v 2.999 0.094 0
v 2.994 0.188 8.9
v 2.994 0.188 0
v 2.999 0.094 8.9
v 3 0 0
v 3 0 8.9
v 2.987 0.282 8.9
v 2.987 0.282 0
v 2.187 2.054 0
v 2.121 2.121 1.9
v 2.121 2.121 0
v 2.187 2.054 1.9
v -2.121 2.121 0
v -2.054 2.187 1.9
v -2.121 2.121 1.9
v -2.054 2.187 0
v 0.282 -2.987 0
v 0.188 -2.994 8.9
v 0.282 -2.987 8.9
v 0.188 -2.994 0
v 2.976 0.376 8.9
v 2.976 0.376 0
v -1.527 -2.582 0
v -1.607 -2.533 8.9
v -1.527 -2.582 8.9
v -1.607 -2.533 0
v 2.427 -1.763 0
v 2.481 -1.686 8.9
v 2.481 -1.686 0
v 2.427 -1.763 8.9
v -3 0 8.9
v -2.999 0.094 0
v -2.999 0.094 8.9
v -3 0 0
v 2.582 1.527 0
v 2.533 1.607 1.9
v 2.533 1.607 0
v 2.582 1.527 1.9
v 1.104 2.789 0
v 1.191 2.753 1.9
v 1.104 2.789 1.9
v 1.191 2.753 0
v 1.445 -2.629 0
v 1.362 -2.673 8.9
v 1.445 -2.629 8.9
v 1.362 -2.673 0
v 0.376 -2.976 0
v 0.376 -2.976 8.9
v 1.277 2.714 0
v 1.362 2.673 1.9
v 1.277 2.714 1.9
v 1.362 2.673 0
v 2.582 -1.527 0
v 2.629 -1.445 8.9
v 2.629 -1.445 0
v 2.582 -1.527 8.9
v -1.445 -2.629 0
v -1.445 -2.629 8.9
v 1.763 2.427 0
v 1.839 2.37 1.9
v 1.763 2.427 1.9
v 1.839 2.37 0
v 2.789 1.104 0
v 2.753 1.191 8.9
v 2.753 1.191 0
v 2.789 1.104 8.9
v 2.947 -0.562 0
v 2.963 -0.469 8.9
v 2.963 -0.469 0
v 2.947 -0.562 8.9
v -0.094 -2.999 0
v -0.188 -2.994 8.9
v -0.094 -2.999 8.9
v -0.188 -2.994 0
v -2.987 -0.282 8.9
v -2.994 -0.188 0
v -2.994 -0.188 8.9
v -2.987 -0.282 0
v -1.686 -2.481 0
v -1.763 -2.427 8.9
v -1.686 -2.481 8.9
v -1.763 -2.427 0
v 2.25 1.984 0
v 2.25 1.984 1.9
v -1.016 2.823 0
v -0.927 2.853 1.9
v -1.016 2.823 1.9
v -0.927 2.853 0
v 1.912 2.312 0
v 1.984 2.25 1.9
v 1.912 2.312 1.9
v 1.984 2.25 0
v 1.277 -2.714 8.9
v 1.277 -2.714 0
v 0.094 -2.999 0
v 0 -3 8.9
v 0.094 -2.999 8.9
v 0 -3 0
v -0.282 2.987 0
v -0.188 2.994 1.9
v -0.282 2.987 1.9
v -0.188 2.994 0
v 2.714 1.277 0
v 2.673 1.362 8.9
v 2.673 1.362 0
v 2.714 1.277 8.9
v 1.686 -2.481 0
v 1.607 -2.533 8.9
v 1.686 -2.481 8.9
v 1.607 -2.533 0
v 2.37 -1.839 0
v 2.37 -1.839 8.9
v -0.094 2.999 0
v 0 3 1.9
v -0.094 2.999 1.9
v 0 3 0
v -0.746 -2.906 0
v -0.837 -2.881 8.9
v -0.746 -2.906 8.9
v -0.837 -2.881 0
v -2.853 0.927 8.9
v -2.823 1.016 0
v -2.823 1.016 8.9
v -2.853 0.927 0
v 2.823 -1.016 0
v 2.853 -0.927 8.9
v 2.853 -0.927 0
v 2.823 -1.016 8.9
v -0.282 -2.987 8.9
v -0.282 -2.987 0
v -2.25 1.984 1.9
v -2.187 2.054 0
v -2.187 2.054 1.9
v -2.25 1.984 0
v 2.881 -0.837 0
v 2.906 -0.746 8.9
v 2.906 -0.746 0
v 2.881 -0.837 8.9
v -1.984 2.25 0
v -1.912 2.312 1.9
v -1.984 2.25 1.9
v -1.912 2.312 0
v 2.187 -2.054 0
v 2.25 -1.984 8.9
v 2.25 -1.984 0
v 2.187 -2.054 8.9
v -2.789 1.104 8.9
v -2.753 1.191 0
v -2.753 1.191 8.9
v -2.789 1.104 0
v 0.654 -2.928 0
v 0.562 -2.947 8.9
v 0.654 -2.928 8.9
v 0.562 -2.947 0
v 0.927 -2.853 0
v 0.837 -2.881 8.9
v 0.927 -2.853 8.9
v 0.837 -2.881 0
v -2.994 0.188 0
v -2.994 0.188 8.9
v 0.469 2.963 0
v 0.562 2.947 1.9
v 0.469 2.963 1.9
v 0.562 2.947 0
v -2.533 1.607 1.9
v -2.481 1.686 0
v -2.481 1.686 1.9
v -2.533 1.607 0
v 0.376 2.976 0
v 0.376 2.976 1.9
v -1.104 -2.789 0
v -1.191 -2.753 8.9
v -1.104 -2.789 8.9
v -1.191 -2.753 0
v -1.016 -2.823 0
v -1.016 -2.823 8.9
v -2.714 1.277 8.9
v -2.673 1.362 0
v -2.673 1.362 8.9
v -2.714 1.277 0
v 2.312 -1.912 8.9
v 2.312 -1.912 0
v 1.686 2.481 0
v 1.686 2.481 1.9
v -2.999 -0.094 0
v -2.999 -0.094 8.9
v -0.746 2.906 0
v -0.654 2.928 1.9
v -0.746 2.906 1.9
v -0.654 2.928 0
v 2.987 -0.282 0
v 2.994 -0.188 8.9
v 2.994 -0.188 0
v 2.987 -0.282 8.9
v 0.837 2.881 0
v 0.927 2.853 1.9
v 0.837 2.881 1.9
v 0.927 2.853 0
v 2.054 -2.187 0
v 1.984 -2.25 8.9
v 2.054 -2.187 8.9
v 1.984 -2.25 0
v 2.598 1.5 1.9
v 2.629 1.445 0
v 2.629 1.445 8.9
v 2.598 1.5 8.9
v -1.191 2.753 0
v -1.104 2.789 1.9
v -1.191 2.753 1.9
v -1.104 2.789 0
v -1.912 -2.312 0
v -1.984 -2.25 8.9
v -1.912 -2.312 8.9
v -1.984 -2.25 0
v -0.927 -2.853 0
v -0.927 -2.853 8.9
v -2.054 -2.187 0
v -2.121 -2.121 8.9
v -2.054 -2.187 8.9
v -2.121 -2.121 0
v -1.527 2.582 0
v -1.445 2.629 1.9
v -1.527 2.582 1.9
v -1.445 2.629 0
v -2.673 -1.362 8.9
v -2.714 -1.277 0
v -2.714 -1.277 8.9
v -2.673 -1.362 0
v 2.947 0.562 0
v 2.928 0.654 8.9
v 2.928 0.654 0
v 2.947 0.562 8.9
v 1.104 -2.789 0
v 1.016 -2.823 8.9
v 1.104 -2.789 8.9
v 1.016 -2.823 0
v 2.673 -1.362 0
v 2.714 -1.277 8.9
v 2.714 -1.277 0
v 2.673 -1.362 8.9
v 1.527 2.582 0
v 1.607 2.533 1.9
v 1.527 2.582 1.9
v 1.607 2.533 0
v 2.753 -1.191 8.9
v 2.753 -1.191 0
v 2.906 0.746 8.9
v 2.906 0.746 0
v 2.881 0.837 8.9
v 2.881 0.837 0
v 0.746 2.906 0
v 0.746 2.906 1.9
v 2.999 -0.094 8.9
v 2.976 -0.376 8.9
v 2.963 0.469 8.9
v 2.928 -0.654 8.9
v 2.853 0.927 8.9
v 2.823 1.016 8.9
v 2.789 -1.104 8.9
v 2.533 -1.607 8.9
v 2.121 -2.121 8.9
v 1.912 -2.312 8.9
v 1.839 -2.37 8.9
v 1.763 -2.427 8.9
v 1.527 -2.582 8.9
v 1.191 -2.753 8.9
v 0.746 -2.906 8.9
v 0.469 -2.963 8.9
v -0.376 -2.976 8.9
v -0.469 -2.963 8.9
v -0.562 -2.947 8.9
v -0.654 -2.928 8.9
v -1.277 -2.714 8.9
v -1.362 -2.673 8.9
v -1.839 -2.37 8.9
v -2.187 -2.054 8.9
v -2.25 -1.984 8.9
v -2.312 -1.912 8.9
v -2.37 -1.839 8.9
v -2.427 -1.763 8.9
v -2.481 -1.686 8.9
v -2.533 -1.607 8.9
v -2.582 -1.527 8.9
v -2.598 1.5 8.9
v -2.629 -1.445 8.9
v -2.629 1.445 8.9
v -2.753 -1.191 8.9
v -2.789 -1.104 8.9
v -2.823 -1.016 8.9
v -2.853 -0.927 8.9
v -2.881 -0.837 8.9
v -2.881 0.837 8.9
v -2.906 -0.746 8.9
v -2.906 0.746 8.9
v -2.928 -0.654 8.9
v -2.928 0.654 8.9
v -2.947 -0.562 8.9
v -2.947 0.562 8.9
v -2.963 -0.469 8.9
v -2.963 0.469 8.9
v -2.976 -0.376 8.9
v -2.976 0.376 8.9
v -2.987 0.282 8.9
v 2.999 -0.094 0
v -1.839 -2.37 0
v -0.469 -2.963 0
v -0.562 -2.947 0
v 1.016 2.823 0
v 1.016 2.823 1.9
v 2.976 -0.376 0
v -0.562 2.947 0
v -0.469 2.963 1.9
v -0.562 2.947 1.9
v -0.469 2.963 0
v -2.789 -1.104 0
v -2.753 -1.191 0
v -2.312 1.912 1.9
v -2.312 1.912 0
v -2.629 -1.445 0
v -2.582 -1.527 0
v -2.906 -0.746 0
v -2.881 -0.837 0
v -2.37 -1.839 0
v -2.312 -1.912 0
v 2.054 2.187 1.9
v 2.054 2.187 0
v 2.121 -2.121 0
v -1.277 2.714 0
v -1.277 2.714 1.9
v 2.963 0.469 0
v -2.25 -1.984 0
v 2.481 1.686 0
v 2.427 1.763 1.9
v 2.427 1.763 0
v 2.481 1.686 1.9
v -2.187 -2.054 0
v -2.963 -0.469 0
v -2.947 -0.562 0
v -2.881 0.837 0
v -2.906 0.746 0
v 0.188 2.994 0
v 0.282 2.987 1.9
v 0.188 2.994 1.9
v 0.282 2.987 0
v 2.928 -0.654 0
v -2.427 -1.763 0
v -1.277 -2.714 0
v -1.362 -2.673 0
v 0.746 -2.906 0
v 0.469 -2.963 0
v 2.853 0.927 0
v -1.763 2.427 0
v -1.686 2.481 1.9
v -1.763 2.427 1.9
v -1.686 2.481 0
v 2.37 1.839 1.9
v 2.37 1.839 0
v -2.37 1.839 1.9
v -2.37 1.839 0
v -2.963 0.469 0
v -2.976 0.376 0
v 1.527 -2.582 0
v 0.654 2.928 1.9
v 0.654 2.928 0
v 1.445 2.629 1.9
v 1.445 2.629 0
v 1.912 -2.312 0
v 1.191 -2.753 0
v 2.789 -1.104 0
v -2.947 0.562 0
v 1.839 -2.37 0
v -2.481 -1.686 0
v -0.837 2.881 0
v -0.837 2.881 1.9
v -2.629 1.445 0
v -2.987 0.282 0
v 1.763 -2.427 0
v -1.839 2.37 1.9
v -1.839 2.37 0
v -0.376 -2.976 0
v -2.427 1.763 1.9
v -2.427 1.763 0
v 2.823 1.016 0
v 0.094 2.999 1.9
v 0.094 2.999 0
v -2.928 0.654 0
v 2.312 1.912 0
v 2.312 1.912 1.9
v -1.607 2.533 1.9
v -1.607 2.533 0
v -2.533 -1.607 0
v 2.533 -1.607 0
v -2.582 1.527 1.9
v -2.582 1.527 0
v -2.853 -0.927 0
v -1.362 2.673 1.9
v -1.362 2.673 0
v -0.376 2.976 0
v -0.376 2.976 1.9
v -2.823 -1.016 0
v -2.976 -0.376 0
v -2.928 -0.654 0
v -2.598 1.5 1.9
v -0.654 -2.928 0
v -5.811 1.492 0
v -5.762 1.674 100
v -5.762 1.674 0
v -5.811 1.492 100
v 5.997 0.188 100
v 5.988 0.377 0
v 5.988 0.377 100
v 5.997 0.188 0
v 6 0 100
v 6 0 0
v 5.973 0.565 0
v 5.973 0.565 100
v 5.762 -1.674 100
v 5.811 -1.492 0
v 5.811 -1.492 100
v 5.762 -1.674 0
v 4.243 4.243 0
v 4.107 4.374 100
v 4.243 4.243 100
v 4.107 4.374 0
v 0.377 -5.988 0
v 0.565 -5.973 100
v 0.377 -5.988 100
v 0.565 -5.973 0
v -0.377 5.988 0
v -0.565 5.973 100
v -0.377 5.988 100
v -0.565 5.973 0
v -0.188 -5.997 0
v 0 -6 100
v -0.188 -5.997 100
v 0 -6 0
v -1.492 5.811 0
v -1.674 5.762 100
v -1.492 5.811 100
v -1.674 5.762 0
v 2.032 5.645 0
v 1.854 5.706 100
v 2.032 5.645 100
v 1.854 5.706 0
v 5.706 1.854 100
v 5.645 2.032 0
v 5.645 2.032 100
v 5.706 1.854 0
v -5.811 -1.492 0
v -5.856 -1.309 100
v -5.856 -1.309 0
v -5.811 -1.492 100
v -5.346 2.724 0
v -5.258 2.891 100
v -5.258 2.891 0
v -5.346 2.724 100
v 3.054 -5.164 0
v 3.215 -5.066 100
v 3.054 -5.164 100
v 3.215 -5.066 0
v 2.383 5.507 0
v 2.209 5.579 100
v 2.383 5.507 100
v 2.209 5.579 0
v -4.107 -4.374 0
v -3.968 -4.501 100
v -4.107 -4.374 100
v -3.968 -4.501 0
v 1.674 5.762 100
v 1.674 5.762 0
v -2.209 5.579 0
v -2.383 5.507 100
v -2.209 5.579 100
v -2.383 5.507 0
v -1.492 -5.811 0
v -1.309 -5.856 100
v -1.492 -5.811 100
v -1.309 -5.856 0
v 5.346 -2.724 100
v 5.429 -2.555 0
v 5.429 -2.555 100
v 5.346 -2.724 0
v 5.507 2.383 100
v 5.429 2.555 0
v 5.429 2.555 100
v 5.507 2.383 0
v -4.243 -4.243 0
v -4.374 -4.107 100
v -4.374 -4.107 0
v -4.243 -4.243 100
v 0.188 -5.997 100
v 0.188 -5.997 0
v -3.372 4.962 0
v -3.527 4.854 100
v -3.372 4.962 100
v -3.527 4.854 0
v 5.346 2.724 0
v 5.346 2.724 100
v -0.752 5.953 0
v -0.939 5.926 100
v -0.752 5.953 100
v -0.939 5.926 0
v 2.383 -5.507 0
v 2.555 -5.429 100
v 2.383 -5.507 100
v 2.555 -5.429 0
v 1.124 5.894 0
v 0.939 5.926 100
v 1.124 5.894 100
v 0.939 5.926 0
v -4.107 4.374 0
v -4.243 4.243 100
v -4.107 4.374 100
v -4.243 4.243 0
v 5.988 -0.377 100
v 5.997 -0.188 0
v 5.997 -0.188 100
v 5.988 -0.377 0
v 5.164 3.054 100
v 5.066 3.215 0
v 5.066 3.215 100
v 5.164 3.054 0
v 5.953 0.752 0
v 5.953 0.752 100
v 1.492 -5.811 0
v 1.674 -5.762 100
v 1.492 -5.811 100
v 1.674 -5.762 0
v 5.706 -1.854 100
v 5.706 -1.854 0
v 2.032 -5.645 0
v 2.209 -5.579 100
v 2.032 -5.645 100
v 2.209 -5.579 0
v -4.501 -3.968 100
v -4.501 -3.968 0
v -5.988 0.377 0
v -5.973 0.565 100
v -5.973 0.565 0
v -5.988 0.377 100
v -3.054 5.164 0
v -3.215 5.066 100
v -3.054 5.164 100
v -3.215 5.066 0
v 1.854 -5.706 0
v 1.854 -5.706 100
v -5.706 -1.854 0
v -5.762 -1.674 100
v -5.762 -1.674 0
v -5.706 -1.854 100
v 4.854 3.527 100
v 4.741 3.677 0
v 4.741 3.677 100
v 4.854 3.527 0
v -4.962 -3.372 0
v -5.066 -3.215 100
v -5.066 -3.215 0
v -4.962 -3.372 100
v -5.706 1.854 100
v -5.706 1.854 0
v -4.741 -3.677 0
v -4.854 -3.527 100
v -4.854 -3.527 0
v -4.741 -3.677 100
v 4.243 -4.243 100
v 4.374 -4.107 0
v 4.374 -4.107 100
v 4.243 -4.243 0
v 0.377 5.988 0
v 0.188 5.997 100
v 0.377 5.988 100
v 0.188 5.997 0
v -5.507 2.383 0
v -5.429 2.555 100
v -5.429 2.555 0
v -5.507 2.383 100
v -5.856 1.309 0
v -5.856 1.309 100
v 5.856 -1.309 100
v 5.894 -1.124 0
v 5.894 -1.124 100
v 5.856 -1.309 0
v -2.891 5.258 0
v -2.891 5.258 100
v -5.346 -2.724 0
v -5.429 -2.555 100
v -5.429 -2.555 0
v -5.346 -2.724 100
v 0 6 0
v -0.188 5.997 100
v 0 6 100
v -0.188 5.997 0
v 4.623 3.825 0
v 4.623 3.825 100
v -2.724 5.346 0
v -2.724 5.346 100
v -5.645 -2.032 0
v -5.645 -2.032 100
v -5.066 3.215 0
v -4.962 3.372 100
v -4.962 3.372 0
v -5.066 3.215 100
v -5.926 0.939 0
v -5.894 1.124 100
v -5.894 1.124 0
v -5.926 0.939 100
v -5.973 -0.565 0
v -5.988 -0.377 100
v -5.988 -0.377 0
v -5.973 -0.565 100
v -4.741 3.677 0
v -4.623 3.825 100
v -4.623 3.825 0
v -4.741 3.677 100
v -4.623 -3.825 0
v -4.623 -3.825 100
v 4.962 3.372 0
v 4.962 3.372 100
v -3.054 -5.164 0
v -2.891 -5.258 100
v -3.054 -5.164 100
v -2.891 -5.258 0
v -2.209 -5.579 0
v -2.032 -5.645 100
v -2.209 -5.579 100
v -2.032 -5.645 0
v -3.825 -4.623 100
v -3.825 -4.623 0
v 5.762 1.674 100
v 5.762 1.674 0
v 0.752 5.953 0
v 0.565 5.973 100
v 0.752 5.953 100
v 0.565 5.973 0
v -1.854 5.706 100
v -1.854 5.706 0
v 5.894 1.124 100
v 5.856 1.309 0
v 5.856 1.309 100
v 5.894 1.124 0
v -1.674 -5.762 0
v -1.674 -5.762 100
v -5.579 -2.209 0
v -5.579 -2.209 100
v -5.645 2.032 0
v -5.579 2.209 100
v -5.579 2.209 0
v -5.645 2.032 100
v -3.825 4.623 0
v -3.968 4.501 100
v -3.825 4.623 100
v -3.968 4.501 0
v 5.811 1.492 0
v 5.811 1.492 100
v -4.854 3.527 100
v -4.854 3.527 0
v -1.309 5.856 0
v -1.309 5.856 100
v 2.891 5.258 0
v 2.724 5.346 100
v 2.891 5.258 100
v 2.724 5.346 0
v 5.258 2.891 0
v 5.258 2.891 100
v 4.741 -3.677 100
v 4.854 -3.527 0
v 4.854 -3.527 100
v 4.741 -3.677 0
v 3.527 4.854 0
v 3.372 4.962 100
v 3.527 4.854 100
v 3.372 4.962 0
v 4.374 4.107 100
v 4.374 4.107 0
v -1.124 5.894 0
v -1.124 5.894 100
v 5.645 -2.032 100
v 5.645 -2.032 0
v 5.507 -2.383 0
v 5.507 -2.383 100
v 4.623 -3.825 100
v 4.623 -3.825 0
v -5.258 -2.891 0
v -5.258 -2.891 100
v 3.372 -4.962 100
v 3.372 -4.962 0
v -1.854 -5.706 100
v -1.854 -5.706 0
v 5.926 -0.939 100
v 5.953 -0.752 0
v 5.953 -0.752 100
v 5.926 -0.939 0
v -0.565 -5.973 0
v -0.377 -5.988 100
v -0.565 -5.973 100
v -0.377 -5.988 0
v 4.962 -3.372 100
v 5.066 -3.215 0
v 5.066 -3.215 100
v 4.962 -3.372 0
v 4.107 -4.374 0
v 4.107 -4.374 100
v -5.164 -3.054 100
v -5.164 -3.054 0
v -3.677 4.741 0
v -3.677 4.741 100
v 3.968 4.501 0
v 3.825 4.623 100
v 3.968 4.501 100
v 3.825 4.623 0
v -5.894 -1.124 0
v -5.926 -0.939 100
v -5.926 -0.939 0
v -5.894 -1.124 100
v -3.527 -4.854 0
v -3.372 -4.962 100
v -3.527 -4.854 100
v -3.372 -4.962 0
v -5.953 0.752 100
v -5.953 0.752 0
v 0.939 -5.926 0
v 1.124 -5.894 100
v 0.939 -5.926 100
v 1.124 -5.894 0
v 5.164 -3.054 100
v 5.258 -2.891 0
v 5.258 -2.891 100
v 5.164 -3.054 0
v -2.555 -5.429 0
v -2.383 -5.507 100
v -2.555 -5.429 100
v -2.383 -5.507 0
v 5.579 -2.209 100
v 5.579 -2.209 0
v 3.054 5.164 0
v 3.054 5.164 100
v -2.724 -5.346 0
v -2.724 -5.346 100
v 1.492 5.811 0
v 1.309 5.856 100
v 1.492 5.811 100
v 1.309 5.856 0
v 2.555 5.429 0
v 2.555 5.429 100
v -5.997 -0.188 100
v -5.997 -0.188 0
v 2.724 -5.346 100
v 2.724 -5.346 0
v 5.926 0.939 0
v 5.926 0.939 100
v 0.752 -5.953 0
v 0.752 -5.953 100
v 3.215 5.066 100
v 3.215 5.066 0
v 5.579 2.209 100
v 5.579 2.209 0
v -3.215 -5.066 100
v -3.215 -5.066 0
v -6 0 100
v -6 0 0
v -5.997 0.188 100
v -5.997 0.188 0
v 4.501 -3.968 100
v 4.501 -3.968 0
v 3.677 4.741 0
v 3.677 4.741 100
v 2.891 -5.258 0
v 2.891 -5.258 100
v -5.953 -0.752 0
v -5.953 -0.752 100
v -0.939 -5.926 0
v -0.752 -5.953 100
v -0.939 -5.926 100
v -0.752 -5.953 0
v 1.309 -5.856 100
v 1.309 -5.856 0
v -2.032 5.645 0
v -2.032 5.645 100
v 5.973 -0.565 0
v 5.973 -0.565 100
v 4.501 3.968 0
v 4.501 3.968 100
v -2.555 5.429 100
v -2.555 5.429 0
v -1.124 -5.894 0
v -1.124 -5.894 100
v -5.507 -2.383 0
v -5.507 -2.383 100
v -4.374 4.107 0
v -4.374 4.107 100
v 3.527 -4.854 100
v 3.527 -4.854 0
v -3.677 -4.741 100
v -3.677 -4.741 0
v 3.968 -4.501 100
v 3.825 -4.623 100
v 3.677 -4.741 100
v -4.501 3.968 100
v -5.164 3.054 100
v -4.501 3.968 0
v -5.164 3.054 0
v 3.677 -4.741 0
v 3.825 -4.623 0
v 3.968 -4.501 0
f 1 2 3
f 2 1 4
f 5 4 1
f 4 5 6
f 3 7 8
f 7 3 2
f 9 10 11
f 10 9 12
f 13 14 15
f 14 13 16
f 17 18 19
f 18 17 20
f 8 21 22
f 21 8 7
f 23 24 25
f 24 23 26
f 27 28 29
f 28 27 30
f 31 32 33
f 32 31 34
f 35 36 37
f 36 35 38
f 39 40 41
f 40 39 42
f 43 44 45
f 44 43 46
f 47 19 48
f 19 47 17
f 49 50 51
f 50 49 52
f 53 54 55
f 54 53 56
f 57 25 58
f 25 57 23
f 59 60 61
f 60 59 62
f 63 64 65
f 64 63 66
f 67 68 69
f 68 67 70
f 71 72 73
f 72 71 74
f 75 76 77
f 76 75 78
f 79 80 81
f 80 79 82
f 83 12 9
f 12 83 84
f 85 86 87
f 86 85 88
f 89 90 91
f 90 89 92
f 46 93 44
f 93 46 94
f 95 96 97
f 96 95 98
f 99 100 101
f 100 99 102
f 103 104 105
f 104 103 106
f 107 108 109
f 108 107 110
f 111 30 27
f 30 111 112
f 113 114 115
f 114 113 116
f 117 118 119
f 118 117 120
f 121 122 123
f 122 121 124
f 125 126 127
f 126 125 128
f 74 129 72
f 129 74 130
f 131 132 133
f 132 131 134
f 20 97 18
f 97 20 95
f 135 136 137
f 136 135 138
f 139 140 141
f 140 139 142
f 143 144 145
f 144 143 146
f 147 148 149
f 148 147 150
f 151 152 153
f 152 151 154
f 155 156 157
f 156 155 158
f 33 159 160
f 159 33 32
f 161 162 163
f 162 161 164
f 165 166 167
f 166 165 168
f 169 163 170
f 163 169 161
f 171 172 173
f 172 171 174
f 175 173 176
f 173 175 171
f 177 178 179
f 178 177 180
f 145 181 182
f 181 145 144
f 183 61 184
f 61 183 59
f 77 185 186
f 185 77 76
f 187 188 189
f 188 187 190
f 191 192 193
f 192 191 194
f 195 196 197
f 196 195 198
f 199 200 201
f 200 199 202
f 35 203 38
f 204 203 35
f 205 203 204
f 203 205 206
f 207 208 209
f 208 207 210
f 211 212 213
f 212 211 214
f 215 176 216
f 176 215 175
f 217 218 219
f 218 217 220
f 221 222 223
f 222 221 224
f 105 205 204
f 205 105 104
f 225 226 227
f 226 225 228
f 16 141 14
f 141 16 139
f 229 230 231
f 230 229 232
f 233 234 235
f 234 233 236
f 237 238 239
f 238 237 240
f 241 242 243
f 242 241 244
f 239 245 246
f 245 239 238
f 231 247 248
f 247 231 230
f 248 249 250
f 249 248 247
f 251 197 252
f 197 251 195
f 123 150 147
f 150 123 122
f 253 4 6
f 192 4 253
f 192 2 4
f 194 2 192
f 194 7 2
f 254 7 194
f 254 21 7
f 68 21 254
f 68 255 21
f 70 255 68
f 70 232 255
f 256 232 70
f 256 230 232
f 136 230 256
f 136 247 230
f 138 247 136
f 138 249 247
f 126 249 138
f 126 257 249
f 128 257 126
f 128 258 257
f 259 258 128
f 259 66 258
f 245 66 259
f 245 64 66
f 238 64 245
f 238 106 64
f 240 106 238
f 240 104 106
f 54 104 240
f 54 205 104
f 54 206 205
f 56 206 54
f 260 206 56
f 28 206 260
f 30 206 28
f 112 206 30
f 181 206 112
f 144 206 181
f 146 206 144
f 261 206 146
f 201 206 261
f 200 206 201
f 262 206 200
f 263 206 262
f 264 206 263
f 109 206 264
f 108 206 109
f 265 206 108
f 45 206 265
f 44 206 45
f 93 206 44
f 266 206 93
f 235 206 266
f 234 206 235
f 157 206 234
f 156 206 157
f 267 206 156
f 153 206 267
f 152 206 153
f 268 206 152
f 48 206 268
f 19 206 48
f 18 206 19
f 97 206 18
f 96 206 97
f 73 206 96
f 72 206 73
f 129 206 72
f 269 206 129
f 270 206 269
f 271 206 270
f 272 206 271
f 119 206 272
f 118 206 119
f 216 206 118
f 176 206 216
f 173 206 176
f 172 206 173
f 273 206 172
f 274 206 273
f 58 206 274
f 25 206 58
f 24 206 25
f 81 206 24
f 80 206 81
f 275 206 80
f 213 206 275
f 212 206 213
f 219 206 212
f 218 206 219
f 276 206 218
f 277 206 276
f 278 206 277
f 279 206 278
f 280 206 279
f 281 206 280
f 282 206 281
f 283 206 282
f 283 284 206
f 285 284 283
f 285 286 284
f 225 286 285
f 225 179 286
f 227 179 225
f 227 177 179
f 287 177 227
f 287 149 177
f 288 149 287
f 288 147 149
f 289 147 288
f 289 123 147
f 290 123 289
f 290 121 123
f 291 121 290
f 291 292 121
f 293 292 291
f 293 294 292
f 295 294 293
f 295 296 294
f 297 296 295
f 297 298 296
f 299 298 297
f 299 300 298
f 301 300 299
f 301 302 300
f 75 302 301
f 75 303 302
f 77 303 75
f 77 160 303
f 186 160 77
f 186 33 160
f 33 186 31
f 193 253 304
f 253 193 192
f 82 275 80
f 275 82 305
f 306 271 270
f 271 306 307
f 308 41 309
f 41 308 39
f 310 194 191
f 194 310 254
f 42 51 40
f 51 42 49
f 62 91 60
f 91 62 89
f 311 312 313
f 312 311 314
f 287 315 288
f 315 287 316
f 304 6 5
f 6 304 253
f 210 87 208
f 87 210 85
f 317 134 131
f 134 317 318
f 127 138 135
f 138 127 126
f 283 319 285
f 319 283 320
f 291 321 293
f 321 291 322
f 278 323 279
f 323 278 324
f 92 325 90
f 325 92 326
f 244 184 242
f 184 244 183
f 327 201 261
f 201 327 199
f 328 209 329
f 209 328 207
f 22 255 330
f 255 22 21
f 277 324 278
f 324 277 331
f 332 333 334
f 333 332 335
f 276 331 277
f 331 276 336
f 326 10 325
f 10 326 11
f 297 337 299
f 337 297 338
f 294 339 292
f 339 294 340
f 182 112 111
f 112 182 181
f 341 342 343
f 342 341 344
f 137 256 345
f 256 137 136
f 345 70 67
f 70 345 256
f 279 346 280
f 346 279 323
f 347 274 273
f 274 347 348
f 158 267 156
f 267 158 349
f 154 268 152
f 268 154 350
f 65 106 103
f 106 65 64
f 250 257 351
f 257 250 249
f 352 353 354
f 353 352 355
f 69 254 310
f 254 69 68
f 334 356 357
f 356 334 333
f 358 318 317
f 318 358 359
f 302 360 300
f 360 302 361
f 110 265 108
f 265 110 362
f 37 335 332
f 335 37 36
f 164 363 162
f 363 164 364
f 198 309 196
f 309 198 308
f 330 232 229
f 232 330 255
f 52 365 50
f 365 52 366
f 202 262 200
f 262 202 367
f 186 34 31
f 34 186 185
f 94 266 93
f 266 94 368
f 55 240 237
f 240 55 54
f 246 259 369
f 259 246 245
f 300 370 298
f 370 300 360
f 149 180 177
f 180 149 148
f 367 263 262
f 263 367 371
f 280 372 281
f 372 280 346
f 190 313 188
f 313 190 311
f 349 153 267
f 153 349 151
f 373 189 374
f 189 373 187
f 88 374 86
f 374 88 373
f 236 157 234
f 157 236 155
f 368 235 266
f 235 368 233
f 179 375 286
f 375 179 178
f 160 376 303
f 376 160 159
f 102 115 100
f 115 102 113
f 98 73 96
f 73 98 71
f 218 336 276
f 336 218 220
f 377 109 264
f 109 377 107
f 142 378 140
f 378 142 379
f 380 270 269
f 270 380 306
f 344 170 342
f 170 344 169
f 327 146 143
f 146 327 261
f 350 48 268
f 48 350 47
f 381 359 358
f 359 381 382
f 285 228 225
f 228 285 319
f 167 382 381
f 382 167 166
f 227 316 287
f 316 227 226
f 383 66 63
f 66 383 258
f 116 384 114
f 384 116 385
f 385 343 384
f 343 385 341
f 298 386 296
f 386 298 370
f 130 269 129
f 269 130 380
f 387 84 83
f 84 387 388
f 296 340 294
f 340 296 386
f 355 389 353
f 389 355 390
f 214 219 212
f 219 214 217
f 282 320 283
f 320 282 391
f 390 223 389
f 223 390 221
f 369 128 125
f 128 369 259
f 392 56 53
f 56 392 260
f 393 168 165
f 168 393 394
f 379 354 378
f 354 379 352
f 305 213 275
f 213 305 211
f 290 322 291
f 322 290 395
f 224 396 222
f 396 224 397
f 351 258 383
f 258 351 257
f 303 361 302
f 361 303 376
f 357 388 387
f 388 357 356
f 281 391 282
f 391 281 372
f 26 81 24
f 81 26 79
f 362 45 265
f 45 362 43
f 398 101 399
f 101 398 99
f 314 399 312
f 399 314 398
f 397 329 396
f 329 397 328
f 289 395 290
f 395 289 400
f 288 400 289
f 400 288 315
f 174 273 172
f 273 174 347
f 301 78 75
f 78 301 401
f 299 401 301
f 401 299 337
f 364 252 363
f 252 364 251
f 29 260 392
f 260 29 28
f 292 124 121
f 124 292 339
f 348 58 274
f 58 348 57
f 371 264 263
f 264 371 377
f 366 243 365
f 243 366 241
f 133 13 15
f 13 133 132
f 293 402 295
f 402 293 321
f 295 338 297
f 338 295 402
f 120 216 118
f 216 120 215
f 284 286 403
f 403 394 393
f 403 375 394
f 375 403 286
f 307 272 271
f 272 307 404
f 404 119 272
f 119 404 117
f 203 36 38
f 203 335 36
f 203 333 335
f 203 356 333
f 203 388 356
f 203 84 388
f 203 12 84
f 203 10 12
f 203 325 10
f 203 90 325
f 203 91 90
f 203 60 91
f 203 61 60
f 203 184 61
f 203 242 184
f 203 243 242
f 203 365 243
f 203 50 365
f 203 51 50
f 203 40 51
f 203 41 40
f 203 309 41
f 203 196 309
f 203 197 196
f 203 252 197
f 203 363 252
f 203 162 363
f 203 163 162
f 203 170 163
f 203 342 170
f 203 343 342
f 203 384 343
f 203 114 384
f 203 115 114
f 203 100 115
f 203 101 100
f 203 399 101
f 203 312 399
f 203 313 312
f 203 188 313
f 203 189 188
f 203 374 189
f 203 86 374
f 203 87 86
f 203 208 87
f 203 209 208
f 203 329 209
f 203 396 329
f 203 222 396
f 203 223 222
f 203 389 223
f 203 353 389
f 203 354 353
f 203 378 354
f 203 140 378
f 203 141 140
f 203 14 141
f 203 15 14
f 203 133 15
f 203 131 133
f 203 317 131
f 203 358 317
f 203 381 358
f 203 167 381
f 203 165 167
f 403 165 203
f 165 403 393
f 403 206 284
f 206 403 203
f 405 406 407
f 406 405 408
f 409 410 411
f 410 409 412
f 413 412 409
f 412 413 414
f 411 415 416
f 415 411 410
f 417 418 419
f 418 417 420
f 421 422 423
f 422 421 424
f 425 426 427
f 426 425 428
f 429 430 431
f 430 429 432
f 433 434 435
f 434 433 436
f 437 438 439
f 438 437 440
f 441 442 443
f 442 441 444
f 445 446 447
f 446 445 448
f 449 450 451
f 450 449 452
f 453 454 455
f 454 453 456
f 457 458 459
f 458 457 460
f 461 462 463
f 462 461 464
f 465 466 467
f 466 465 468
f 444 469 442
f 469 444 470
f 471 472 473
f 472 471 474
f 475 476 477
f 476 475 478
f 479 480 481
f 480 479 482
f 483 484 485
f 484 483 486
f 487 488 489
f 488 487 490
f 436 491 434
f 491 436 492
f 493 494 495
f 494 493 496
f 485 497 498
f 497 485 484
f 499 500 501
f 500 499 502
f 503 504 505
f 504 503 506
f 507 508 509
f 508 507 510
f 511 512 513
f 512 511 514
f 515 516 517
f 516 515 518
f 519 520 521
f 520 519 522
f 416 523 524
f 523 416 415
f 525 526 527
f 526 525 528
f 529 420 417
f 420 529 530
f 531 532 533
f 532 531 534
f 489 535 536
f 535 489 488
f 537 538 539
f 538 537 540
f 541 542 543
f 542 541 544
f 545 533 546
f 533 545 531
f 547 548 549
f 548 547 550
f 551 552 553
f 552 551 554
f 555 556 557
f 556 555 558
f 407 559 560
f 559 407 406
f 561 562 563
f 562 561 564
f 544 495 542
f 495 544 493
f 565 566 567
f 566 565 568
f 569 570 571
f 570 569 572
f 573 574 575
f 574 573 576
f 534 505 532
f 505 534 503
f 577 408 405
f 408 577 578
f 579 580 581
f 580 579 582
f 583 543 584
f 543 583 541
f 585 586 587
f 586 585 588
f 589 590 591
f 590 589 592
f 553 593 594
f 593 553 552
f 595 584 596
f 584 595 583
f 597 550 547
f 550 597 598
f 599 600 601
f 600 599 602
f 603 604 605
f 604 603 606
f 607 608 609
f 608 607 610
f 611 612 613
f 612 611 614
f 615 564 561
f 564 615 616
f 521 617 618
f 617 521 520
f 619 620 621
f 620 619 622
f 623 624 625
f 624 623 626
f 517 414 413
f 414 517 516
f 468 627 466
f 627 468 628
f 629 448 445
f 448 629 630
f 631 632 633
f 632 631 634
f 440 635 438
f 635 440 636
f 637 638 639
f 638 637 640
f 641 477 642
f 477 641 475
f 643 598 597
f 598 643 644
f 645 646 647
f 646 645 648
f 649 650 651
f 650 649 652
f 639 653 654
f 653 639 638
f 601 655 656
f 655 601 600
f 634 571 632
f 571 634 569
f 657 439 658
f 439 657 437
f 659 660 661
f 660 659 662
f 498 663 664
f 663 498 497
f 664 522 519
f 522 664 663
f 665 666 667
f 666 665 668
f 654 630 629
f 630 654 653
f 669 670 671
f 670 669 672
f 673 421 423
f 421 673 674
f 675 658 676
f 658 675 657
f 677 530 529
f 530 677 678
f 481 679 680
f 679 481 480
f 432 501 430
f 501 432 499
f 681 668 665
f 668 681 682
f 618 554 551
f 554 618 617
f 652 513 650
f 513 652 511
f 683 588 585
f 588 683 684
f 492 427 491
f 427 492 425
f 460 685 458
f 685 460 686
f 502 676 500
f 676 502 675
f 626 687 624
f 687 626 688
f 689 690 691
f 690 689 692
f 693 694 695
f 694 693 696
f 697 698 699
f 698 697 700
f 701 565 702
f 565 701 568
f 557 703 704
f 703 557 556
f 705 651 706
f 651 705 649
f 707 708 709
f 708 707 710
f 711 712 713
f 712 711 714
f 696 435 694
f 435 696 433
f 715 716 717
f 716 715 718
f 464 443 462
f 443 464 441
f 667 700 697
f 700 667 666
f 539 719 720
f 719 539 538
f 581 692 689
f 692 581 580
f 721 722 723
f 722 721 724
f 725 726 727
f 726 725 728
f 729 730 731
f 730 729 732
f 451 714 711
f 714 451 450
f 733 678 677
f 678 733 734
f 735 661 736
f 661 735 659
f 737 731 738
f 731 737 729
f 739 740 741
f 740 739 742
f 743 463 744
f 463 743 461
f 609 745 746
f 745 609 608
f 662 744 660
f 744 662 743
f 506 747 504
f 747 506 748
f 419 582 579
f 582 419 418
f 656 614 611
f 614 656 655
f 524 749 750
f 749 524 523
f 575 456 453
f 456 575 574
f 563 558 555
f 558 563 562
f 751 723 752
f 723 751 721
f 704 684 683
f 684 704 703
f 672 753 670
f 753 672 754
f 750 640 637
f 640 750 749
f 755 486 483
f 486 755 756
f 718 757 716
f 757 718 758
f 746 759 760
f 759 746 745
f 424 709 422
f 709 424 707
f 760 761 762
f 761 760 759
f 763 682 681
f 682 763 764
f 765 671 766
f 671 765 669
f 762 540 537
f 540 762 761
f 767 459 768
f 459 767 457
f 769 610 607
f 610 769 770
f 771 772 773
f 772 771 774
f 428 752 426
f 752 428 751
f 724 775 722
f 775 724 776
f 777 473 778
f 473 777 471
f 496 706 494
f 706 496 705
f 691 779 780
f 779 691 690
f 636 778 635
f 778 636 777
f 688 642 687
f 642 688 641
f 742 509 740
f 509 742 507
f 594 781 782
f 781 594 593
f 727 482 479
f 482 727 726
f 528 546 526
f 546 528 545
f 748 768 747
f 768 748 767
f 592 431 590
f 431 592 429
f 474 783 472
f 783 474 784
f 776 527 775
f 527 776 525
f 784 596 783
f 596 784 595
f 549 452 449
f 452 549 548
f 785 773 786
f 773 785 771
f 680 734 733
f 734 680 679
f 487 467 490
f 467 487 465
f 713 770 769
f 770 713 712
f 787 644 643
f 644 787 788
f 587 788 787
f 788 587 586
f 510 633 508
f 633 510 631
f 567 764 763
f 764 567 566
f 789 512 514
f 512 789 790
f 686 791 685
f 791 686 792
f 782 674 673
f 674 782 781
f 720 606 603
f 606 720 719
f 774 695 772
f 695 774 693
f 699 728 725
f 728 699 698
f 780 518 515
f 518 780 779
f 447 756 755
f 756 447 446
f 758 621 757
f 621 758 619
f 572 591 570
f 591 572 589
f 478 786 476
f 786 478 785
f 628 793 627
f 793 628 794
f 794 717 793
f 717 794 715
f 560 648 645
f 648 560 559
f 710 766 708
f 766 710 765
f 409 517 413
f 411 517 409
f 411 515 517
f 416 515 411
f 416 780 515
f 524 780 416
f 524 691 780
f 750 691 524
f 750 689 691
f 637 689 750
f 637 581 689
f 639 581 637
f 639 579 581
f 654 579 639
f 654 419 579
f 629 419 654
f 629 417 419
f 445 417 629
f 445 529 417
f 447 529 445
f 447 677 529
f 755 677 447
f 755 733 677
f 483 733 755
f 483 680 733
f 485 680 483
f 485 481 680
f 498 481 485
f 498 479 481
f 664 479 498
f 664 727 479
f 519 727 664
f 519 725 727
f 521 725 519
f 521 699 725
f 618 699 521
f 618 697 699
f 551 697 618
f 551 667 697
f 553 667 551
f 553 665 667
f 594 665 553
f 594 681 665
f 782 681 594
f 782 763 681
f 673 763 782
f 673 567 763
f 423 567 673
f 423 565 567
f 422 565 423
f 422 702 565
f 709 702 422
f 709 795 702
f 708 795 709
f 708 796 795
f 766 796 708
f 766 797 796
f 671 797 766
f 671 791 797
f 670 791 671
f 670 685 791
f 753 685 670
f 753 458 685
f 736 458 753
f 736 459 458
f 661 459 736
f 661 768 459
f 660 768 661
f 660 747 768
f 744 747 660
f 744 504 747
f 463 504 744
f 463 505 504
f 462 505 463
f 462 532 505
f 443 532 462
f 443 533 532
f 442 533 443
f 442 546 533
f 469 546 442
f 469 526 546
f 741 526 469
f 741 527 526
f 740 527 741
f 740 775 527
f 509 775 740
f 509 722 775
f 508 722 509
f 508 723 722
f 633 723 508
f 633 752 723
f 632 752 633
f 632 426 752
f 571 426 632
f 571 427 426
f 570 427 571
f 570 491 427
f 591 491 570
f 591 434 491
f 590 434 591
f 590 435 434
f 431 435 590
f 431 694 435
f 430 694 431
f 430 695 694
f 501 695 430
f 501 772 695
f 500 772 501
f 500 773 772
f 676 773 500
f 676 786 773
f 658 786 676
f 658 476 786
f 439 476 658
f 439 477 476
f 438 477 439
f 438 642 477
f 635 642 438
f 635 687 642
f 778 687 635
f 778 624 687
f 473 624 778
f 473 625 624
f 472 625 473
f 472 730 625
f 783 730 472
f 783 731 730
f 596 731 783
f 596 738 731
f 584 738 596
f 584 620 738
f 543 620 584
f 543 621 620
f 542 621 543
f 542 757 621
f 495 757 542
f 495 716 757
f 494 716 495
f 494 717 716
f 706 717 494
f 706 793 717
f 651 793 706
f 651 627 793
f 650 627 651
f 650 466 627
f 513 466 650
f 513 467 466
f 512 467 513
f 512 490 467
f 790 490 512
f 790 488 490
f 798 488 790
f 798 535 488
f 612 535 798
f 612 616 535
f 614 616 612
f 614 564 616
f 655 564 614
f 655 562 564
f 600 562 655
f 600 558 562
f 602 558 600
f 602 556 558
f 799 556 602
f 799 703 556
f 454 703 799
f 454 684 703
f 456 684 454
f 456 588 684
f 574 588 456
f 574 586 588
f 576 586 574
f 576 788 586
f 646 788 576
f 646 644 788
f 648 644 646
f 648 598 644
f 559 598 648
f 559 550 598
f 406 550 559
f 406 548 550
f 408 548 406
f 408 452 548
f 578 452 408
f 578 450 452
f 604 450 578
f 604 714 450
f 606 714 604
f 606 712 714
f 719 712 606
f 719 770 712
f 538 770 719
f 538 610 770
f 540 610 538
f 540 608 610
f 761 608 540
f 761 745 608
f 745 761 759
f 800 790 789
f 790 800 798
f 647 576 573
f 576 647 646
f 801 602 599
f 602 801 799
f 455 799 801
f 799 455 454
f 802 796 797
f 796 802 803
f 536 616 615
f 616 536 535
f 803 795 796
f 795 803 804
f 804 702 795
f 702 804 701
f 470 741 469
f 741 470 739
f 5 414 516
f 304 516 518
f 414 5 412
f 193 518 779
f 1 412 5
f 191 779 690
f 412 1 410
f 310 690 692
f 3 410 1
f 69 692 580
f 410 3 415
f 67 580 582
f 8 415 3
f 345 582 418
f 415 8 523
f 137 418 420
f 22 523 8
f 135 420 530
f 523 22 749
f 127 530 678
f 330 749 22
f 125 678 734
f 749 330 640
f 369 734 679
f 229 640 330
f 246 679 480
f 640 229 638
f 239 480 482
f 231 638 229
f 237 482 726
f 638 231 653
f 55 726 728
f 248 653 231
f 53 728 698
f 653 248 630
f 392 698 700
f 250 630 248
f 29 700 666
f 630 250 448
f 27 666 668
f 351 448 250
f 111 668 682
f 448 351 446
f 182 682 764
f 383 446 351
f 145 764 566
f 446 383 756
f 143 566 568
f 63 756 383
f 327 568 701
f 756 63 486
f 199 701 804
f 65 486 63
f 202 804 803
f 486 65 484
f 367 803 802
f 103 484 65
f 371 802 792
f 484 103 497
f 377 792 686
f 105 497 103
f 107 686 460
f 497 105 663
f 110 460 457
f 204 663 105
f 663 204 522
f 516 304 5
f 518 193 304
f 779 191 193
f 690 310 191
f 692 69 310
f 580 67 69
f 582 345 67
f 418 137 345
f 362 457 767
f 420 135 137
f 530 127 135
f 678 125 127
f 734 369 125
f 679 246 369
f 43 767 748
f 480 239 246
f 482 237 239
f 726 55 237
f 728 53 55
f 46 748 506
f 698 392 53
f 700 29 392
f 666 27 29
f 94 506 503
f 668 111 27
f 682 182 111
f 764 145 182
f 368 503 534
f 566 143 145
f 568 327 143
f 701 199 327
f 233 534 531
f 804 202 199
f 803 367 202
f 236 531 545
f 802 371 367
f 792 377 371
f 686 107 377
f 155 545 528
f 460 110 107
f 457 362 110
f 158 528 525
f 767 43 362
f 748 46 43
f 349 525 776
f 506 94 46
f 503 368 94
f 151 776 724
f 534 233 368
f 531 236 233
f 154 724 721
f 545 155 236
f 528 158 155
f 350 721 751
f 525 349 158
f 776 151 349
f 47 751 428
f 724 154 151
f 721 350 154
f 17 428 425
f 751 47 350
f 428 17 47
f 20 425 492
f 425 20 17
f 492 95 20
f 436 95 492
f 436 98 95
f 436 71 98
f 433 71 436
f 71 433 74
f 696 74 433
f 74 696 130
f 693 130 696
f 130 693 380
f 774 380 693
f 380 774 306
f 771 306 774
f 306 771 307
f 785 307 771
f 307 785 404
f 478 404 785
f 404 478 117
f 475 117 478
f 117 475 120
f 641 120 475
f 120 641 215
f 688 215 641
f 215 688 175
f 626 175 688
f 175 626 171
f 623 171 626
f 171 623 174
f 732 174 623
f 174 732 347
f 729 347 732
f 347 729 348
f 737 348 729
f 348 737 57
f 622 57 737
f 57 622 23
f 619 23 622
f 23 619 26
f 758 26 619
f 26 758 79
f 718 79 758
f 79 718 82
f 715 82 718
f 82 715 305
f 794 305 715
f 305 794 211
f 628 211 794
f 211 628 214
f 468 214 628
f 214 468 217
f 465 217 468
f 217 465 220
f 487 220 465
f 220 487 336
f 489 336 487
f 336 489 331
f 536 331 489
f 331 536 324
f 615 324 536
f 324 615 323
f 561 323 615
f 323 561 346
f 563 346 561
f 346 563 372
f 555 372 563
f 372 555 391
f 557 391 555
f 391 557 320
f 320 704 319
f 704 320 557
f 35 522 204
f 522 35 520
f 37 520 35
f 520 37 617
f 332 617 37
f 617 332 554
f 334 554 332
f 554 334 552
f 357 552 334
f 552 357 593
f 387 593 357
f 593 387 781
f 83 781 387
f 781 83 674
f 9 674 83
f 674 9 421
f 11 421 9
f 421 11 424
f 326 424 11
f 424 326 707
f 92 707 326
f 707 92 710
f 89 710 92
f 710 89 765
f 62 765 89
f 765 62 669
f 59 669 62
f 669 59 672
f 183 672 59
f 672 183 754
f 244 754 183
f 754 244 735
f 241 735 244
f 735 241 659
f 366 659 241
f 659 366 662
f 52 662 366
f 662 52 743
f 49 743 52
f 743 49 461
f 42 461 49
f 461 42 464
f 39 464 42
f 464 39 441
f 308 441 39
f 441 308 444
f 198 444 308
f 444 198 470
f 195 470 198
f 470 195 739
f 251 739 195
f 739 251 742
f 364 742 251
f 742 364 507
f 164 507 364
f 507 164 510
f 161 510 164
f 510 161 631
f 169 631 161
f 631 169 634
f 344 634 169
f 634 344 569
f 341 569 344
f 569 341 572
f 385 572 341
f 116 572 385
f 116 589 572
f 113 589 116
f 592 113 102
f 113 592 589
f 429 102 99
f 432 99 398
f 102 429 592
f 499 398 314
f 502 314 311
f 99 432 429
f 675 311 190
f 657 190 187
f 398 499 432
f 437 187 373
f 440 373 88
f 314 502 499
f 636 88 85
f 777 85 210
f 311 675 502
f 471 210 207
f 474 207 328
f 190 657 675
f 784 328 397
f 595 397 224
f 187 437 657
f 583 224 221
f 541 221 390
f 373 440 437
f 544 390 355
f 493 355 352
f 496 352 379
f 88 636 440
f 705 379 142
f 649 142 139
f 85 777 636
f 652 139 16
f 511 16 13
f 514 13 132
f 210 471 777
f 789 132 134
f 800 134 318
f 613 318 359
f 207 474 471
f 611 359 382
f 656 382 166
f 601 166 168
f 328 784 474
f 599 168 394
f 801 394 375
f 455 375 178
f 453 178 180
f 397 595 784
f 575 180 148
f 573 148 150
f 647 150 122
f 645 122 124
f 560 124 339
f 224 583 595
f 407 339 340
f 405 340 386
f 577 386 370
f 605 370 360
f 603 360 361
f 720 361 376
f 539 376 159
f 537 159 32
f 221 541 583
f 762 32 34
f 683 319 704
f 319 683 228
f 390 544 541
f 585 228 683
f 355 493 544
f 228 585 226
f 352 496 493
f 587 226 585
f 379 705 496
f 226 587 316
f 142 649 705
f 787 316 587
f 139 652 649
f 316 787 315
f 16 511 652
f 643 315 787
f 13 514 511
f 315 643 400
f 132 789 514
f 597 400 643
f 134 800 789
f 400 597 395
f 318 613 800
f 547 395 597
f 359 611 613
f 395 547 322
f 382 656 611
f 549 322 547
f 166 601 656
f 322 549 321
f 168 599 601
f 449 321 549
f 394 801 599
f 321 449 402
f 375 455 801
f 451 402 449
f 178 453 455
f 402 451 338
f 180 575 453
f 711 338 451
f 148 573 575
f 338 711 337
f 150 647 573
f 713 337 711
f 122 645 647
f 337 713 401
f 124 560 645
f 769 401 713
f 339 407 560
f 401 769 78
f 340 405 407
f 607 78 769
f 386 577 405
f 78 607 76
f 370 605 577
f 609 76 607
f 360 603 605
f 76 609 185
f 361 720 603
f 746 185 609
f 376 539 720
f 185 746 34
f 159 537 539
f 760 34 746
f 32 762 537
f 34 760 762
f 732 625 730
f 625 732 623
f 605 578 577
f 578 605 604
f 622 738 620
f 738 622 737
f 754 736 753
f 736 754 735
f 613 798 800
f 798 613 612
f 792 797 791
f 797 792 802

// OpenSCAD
shaft_height = 100;
shaft_diameter = 12;

insert_diameter = 6;
insert_cut_off =  insert_diameter - 4.5;

insert_cut_off_height = 7;

insert_height = 9;

module insert()
{
    difference(){
        {cylinder(insert_height, d=insert_diameter, $fn=200);}
        translate([-insert_diameter/2, (insert_diameter/2)-insert_cut_off, insert_height-     insert_cut_off_height]) {cube([insert_diameter, insert_cut_off, insert_cut_off_height]);}
     }
 }

module shaft()
{
    difference() {
         {cylinder( shaft_height, d=shaft_diameter, $fn=200);} 
         translate([0,0,-0.1]) {insert();}
     }
}

shaft();
